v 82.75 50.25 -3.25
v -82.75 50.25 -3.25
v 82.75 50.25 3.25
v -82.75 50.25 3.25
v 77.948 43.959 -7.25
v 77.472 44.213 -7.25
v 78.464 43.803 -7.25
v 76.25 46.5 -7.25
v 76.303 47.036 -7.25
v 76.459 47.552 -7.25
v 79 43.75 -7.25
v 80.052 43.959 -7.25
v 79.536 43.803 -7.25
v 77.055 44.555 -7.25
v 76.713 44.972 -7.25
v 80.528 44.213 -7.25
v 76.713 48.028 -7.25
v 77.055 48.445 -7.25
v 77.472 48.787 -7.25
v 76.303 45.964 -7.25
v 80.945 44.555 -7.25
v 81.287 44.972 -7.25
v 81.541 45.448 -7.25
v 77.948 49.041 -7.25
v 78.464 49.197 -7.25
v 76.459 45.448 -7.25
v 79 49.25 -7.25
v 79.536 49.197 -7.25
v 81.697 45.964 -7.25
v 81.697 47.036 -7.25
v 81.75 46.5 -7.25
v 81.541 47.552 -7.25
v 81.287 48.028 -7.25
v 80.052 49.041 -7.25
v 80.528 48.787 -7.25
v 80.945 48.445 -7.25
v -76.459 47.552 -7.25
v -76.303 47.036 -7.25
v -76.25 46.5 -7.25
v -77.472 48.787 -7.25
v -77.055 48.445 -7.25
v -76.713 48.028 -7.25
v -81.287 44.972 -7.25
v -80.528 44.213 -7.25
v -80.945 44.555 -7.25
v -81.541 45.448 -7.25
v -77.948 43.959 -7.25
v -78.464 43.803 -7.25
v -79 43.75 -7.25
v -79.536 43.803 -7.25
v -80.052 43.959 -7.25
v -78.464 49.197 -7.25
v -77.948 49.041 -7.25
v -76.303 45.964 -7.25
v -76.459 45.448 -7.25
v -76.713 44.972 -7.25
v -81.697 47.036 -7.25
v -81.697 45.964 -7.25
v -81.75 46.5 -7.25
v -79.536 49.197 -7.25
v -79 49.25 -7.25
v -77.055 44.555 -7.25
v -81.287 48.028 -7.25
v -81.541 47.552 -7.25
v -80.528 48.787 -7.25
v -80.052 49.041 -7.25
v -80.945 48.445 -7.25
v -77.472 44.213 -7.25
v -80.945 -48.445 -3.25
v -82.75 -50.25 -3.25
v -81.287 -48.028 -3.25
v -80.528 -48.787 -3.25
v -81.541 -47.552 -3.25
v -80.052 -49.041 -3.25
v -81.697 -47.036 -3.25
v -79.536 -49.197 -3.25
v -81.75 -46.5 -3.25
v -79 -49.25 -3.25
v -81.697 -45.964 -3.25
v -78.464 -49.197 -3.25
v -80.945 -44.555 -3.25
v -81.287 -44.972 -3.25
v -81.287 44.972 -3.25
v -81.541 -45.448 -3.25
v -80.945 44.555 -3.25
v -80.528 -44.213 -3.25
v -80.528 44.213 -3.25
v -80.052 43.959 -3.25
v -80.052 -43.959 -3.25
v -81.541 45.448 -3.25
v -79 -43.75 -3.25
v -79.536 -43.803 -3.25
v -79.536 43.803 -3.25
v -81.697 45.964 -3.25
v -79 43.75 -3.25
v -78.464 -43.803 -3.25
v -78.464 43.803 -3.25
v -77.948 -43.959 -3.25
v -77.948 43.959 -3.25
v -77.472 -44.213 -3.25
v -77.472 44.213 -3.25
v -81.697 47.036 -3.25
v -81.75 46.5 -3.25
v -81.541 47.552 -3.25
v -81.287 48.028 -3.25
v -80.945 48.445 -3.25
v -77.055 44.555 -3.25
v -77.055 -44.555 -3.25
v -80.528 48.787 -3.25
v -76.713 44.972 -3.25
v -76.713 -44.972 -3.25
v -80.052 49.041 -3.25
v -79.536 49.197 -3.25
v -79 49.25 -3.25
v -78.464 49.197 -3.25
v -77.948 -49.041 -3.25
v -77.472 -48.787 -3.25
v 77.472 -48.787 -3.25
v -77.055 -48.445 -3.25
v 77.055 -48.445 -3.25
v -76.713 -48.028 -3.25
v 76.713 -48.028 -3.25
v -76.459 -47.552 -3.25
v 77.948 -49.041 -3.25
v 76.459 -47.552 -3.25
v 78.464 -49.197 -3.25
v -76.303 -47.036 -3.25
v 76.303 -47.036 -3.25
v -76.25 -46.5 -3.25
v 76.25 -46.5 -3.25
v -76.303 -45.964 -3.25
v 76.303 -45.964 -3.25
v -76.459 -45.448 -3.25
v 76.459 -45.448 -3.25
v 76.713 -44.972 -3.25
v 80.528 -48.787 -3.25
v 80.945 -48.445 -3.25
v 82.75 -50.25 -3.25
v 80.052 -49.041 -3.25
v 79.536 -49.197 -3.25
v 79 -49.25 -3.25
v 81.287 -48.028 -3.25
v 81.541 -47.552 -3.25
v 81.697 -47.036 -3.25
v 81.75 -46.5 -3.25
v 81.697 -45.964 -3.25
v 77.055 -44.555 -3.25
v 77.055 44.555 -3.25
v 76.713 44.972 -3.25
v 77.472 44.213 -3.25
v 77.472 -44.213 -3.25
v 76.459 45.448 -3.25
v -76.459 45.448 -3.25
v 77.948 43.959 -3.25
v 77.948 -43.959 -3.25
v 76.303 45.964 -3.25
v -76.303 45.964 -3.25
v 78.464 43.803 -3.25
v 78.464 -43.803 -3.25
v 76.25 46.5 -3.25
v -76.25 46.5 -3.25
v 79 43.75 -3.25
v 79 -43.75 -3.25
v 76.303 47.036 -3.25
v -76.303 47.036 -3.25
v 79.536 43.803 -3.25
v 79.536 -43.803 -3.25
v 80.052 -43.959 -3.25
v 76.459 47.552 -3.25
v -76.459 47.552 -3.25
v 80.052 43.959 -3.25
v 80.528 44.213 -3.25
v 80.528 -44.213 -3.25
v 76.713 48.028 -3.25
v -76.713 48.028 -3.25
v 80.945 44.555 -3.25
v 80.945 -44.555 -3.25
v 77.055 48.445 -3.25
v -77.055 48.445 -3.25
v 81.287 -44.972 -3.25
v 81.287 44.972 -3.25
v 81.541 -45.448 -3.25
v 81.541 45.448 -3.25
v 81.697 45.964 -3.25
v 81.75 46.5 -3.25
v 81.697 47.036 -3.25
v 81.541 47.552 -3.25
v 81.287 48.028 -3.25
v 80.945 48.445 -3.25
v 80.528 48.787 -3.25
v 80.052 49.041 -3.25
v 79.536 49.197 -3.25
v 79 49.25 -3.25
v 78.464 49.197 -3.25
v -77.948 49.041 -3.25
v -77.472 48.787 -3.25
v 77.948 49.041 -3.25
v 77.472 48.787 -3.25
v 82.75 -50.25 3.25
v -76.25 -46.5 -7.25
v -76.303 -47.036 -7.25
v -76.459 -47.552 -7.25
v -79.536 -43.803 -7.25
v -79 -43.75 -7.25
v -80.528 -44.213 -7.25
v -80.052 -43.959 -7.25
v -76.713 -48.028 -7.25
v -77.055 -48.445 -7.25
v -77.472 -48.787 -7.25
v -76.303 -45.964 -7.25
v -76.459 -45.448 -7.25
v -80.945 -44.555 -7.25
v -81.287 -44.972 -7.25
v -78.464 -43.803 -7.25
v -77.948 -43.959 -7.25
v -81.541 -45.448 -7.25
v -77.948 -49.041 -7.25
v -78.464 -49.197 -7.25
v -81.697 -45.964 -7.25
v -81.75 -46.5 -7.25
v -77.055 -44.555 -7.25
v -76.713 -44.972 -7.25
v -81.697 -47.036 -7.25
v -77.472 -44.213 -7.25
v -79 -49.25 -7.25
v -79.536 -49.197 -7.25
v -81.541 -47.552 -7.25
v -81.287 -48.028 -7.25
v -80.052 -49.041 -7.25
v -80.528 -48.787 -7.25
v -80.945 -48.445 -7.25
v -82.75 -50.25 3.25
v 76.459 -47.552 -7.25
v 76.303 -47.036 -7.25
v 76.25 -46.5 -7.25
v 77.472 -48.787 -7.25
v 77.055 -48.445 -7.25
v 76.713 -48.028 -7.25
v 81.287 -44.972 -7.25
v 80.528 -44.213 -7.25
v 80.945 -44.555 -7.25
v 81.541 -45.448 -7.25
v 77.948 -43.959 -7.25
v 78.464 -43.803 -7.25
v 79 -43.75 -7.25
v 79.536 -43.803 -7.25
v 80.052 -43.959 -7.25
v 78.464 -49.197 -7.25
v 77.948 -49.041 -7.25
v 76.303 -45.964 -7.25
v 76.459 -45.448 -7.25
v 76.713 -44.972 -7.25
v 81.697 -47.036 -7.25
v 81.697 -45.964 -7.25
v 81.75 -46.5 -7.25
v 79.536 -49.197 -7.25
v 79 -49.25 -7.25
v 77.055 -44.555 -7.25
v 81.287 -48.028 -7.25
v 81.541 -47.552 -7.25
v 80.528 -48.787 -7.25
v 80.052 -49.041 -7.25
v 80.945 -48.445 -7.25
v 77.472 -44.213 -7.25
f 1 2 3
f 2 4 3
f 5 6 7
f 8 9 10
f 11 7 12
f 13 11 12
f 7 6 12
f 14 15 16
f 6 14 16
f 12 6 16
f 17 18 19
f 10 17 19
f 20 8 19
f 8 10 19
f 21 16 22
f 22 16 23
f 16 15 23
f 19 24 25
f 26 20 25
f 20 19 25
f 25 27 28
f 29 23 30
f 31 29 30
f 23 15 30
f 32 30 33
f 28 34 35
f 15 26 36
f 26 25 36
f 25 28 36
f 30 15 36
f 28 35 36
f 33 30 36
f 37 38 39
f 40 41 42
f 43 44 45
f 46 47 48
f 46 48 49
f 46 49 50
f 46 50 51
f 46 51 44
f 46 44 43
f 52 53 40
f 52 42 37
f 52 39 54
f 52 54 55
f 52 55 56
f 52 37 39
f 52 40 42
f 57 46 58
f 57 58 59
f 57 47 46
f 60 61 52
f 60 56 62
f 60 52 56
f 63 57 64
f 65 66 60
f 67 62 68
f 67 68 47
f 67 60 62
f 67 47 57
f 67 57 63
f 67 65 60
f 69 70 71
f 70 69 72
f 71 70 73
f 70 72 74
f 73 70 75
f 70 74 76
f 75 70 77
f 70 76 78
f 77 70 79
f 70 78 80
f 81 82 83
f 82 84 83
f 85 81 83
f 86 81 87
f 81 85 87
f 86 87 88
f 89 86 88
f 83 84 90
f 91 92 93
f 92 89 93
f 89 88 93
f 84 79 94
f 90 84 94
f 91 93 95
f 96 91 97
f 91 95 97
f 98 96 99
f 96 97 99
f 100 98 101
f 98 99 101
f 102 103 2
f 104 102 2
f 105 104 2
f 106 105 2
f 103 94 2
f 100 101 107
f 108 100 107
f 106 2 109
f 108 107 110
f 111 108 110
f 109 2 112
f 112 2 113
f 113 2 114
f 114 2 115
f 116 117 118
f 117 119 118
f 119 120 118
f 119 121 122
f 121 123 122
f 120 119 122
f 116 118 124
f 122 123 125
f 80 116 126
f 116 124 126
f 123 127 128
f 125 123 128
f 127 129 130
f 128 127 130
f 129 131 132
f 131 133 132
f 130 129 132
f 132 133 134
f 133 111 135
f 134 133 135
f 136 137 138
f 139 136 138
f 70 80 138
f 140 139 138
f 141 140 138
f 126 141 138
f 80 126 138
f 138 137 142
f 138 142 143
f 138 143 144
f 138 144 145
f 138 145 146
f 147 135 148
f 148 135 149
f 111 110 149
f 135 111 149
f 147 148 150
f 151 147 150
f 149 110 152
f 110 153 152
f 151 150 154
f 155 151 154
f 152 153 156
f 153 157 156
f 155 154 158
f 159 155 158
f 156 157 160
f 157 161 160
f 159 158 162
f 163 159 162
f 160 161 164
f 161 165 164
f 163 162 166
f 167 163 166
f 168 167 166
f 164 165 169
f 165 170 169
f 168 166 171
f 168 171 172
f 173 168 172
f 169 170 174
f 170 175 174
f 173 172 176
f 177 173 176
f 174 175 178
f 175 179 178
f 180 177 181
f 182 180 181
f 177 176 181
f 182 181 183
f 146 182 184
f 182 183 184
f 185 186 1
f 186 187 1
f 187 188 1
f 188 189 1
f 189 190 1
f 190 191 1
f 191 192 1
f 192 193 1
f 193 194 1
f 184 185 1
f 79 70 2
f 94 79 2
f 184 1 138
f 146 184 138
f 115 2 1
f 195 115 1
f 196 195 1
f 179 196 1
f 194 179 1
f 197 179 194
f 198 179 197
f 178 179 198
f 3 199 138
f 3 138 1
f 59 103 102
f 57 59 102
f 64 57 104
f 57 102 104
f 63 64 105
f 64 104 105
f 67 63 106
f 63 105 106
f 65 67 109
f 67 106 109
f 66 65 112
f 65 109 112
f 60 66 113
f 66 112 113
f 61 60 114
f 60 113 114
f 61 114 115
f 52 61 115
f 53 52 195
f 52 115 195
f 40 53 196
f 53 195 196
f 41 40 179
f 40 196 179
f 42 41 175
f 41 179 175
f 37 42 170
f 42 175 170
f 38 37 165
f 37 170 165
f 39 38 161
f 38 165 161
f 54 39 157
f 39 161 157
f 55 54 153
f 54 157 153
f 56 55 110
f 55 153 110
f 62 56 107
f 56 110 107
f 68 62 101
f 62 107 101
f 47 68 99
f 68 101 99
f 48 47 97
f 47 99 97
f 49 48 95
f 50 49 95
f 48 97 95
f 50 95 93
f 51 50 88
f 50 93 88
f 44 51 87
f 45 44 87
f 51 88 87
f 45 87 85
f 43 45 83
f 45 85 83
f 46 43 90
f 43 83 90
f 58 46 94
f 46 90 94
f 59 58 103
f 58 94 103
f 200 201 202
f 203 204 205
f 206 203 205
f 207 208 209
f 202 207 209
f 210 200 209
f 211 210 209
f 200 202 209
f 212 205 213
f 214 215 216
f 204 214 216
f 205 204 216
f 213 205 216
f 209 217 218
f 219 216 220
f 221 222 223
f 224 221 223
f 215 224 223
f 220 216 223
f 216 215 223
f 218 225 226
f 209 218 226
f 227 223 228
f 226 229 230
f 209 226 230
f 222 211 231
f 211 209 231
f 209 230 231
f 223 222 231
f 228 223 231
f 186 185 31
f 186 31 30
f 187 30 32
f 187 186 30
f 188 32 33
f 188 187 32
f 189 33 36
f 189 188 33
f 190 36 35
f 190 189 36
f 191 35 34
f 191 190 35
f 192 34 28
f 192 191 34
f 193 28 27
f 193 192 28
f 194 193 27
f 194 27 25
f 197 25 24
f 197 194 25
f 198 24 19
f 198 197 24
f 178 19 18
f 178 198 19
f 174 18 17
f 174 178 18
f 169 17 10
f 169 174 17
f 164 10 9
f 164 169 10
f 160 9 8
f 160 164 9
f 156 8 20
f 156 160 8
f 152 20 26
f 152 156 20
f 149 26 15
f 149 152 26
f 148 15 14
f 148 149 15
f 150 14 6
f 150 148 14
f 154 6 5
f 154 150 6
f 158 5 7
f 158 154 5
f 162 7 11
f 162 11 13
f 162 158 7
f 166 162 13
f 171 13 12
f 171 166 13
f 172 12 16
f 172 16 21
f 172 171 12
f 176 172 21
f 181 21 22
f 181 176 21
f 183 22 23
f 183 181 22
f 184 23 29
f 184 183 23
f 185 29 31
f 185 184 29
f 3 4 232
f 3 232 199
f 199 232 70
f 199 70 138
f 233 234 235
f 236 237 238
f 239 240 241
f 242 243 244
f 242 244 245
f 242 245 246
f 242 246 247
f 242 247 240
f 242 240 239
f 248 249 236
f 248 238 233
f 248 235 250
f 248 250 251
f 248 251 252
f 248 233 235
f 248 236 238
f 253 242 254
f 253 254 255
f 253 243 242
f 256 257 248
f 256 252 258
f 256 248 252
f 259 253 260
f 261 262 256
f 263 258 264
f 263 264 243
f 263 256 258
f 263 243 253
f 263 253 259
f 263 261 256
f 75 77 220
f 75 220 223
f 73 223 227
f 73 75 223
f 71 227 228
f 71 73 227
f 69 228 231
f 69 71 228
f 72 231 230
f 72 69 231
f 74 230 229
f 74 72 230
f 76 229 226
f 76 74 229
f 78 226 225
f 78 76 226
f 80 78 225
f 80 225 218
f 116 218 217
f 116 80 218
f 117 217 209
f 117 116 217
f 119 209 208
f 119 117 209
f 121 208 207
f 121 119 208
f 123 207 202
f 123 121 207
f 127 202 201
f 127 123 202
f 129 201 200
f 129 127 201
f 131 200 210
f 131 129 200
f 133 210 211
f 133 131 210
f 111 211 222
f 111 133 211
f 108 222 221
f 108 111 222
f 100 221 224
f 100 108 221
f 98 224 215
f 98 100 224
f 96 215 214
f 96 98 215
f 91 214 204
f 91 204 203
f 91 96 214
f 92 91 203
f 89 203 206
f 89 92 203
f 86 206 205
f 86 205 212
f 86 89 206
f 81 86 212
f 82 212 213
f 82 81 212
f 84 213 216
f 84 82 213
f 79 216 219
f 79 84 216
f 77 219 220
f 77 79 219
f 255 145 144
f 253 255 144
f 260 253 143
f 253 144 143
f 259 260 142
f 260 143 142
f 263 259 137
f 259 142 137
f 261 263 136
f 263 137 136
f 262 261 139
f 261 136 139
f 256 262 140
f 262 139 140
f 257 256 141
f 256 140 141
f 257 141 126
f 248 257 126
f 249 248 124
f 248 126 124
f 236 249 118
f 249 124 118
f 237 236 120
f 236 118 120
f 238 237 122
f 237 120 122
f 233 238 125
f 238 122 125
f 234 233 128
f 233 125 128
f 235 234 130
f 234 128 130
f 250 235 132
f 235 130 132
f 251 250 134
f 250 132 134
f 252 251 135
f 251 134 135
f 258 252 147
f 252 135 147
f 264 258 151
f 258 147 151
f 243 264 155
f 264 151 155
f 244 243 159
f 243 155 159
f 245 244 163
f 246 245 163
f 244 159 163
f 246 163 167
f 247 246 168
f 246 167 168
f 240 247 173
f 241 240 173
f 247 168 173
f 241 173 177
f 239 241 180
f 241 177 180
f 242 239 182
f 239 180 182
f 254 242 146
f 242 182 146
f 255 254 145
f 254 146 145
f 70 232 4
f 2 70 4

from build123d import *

# Parameters (mm, degrees)
SKETCH_1_W                                 = 165.5
SKETCH_1_H                                 = 100.5
EXTRUDE_1_DEPTH                            = 3.25
SKETCH_2_R                                 = 2.75
EXTRUDE_2_DEPTH                            = 4
MIRROR_1_AT_THE_SECOND_PLANE_COPY_1_SKET_R = 2.75
MIRROR_1_AT_THE_SECOND_PLANE_COPY_1_DEPTH  = 4


with BuildPart() as part:
    # 草图1 → 凸台-拉伸1 (new, symmetric)
    with BuildSketch(Plane.XY):
        Rectangle(SKETCH_1_W, SKETCH_1_H)
    extrude(amount=EXTRUDE_1_DEPTH, both=True)

    # 草图2 → 凸台-拉伸2 (add)
    with BuildSketch(Plane(origin=(0, 0, -3.25), x_dir=(-1, 0, 0), z_dir=(0, 0, -1))):
        with Locations((79, 46.5)):
            Circle(SKETCH_2_R)
    extrude_2 = extrude(amount=EXTRUDE_2_DEPTH)

    # 镜向1: 凸台-拉伸2 across plane
    add(extrude_2.mirror(Plane.ZX))

    # 镜向1 at the second plane: 凸台-拉伸2 across plane
    add(extrude_2.mirror(Plane(origin=(0, 0, 0), x_dir=(0, 0, 1), z_dir=(1, 0, 0))))

    # 镜向1 at the second plane copy 1 sket → 镜向1 at the second plane copy 1 (add)
    with BuildSketch(Plane(origin=(0, 0, -3.25), x_dir=(1, 0, 0), z_dir=(0, 0, -1))):
        with Locations((79, 46.5)):
            Circle(MIRROR_1_AT_THE_SECOND_PLANE_COPY_1_SKET_R)
    extrude(amount=MIRROR_1_AT_THE_SECOND_PLANE_COPY_1_DEPTH)


solid = part.part
